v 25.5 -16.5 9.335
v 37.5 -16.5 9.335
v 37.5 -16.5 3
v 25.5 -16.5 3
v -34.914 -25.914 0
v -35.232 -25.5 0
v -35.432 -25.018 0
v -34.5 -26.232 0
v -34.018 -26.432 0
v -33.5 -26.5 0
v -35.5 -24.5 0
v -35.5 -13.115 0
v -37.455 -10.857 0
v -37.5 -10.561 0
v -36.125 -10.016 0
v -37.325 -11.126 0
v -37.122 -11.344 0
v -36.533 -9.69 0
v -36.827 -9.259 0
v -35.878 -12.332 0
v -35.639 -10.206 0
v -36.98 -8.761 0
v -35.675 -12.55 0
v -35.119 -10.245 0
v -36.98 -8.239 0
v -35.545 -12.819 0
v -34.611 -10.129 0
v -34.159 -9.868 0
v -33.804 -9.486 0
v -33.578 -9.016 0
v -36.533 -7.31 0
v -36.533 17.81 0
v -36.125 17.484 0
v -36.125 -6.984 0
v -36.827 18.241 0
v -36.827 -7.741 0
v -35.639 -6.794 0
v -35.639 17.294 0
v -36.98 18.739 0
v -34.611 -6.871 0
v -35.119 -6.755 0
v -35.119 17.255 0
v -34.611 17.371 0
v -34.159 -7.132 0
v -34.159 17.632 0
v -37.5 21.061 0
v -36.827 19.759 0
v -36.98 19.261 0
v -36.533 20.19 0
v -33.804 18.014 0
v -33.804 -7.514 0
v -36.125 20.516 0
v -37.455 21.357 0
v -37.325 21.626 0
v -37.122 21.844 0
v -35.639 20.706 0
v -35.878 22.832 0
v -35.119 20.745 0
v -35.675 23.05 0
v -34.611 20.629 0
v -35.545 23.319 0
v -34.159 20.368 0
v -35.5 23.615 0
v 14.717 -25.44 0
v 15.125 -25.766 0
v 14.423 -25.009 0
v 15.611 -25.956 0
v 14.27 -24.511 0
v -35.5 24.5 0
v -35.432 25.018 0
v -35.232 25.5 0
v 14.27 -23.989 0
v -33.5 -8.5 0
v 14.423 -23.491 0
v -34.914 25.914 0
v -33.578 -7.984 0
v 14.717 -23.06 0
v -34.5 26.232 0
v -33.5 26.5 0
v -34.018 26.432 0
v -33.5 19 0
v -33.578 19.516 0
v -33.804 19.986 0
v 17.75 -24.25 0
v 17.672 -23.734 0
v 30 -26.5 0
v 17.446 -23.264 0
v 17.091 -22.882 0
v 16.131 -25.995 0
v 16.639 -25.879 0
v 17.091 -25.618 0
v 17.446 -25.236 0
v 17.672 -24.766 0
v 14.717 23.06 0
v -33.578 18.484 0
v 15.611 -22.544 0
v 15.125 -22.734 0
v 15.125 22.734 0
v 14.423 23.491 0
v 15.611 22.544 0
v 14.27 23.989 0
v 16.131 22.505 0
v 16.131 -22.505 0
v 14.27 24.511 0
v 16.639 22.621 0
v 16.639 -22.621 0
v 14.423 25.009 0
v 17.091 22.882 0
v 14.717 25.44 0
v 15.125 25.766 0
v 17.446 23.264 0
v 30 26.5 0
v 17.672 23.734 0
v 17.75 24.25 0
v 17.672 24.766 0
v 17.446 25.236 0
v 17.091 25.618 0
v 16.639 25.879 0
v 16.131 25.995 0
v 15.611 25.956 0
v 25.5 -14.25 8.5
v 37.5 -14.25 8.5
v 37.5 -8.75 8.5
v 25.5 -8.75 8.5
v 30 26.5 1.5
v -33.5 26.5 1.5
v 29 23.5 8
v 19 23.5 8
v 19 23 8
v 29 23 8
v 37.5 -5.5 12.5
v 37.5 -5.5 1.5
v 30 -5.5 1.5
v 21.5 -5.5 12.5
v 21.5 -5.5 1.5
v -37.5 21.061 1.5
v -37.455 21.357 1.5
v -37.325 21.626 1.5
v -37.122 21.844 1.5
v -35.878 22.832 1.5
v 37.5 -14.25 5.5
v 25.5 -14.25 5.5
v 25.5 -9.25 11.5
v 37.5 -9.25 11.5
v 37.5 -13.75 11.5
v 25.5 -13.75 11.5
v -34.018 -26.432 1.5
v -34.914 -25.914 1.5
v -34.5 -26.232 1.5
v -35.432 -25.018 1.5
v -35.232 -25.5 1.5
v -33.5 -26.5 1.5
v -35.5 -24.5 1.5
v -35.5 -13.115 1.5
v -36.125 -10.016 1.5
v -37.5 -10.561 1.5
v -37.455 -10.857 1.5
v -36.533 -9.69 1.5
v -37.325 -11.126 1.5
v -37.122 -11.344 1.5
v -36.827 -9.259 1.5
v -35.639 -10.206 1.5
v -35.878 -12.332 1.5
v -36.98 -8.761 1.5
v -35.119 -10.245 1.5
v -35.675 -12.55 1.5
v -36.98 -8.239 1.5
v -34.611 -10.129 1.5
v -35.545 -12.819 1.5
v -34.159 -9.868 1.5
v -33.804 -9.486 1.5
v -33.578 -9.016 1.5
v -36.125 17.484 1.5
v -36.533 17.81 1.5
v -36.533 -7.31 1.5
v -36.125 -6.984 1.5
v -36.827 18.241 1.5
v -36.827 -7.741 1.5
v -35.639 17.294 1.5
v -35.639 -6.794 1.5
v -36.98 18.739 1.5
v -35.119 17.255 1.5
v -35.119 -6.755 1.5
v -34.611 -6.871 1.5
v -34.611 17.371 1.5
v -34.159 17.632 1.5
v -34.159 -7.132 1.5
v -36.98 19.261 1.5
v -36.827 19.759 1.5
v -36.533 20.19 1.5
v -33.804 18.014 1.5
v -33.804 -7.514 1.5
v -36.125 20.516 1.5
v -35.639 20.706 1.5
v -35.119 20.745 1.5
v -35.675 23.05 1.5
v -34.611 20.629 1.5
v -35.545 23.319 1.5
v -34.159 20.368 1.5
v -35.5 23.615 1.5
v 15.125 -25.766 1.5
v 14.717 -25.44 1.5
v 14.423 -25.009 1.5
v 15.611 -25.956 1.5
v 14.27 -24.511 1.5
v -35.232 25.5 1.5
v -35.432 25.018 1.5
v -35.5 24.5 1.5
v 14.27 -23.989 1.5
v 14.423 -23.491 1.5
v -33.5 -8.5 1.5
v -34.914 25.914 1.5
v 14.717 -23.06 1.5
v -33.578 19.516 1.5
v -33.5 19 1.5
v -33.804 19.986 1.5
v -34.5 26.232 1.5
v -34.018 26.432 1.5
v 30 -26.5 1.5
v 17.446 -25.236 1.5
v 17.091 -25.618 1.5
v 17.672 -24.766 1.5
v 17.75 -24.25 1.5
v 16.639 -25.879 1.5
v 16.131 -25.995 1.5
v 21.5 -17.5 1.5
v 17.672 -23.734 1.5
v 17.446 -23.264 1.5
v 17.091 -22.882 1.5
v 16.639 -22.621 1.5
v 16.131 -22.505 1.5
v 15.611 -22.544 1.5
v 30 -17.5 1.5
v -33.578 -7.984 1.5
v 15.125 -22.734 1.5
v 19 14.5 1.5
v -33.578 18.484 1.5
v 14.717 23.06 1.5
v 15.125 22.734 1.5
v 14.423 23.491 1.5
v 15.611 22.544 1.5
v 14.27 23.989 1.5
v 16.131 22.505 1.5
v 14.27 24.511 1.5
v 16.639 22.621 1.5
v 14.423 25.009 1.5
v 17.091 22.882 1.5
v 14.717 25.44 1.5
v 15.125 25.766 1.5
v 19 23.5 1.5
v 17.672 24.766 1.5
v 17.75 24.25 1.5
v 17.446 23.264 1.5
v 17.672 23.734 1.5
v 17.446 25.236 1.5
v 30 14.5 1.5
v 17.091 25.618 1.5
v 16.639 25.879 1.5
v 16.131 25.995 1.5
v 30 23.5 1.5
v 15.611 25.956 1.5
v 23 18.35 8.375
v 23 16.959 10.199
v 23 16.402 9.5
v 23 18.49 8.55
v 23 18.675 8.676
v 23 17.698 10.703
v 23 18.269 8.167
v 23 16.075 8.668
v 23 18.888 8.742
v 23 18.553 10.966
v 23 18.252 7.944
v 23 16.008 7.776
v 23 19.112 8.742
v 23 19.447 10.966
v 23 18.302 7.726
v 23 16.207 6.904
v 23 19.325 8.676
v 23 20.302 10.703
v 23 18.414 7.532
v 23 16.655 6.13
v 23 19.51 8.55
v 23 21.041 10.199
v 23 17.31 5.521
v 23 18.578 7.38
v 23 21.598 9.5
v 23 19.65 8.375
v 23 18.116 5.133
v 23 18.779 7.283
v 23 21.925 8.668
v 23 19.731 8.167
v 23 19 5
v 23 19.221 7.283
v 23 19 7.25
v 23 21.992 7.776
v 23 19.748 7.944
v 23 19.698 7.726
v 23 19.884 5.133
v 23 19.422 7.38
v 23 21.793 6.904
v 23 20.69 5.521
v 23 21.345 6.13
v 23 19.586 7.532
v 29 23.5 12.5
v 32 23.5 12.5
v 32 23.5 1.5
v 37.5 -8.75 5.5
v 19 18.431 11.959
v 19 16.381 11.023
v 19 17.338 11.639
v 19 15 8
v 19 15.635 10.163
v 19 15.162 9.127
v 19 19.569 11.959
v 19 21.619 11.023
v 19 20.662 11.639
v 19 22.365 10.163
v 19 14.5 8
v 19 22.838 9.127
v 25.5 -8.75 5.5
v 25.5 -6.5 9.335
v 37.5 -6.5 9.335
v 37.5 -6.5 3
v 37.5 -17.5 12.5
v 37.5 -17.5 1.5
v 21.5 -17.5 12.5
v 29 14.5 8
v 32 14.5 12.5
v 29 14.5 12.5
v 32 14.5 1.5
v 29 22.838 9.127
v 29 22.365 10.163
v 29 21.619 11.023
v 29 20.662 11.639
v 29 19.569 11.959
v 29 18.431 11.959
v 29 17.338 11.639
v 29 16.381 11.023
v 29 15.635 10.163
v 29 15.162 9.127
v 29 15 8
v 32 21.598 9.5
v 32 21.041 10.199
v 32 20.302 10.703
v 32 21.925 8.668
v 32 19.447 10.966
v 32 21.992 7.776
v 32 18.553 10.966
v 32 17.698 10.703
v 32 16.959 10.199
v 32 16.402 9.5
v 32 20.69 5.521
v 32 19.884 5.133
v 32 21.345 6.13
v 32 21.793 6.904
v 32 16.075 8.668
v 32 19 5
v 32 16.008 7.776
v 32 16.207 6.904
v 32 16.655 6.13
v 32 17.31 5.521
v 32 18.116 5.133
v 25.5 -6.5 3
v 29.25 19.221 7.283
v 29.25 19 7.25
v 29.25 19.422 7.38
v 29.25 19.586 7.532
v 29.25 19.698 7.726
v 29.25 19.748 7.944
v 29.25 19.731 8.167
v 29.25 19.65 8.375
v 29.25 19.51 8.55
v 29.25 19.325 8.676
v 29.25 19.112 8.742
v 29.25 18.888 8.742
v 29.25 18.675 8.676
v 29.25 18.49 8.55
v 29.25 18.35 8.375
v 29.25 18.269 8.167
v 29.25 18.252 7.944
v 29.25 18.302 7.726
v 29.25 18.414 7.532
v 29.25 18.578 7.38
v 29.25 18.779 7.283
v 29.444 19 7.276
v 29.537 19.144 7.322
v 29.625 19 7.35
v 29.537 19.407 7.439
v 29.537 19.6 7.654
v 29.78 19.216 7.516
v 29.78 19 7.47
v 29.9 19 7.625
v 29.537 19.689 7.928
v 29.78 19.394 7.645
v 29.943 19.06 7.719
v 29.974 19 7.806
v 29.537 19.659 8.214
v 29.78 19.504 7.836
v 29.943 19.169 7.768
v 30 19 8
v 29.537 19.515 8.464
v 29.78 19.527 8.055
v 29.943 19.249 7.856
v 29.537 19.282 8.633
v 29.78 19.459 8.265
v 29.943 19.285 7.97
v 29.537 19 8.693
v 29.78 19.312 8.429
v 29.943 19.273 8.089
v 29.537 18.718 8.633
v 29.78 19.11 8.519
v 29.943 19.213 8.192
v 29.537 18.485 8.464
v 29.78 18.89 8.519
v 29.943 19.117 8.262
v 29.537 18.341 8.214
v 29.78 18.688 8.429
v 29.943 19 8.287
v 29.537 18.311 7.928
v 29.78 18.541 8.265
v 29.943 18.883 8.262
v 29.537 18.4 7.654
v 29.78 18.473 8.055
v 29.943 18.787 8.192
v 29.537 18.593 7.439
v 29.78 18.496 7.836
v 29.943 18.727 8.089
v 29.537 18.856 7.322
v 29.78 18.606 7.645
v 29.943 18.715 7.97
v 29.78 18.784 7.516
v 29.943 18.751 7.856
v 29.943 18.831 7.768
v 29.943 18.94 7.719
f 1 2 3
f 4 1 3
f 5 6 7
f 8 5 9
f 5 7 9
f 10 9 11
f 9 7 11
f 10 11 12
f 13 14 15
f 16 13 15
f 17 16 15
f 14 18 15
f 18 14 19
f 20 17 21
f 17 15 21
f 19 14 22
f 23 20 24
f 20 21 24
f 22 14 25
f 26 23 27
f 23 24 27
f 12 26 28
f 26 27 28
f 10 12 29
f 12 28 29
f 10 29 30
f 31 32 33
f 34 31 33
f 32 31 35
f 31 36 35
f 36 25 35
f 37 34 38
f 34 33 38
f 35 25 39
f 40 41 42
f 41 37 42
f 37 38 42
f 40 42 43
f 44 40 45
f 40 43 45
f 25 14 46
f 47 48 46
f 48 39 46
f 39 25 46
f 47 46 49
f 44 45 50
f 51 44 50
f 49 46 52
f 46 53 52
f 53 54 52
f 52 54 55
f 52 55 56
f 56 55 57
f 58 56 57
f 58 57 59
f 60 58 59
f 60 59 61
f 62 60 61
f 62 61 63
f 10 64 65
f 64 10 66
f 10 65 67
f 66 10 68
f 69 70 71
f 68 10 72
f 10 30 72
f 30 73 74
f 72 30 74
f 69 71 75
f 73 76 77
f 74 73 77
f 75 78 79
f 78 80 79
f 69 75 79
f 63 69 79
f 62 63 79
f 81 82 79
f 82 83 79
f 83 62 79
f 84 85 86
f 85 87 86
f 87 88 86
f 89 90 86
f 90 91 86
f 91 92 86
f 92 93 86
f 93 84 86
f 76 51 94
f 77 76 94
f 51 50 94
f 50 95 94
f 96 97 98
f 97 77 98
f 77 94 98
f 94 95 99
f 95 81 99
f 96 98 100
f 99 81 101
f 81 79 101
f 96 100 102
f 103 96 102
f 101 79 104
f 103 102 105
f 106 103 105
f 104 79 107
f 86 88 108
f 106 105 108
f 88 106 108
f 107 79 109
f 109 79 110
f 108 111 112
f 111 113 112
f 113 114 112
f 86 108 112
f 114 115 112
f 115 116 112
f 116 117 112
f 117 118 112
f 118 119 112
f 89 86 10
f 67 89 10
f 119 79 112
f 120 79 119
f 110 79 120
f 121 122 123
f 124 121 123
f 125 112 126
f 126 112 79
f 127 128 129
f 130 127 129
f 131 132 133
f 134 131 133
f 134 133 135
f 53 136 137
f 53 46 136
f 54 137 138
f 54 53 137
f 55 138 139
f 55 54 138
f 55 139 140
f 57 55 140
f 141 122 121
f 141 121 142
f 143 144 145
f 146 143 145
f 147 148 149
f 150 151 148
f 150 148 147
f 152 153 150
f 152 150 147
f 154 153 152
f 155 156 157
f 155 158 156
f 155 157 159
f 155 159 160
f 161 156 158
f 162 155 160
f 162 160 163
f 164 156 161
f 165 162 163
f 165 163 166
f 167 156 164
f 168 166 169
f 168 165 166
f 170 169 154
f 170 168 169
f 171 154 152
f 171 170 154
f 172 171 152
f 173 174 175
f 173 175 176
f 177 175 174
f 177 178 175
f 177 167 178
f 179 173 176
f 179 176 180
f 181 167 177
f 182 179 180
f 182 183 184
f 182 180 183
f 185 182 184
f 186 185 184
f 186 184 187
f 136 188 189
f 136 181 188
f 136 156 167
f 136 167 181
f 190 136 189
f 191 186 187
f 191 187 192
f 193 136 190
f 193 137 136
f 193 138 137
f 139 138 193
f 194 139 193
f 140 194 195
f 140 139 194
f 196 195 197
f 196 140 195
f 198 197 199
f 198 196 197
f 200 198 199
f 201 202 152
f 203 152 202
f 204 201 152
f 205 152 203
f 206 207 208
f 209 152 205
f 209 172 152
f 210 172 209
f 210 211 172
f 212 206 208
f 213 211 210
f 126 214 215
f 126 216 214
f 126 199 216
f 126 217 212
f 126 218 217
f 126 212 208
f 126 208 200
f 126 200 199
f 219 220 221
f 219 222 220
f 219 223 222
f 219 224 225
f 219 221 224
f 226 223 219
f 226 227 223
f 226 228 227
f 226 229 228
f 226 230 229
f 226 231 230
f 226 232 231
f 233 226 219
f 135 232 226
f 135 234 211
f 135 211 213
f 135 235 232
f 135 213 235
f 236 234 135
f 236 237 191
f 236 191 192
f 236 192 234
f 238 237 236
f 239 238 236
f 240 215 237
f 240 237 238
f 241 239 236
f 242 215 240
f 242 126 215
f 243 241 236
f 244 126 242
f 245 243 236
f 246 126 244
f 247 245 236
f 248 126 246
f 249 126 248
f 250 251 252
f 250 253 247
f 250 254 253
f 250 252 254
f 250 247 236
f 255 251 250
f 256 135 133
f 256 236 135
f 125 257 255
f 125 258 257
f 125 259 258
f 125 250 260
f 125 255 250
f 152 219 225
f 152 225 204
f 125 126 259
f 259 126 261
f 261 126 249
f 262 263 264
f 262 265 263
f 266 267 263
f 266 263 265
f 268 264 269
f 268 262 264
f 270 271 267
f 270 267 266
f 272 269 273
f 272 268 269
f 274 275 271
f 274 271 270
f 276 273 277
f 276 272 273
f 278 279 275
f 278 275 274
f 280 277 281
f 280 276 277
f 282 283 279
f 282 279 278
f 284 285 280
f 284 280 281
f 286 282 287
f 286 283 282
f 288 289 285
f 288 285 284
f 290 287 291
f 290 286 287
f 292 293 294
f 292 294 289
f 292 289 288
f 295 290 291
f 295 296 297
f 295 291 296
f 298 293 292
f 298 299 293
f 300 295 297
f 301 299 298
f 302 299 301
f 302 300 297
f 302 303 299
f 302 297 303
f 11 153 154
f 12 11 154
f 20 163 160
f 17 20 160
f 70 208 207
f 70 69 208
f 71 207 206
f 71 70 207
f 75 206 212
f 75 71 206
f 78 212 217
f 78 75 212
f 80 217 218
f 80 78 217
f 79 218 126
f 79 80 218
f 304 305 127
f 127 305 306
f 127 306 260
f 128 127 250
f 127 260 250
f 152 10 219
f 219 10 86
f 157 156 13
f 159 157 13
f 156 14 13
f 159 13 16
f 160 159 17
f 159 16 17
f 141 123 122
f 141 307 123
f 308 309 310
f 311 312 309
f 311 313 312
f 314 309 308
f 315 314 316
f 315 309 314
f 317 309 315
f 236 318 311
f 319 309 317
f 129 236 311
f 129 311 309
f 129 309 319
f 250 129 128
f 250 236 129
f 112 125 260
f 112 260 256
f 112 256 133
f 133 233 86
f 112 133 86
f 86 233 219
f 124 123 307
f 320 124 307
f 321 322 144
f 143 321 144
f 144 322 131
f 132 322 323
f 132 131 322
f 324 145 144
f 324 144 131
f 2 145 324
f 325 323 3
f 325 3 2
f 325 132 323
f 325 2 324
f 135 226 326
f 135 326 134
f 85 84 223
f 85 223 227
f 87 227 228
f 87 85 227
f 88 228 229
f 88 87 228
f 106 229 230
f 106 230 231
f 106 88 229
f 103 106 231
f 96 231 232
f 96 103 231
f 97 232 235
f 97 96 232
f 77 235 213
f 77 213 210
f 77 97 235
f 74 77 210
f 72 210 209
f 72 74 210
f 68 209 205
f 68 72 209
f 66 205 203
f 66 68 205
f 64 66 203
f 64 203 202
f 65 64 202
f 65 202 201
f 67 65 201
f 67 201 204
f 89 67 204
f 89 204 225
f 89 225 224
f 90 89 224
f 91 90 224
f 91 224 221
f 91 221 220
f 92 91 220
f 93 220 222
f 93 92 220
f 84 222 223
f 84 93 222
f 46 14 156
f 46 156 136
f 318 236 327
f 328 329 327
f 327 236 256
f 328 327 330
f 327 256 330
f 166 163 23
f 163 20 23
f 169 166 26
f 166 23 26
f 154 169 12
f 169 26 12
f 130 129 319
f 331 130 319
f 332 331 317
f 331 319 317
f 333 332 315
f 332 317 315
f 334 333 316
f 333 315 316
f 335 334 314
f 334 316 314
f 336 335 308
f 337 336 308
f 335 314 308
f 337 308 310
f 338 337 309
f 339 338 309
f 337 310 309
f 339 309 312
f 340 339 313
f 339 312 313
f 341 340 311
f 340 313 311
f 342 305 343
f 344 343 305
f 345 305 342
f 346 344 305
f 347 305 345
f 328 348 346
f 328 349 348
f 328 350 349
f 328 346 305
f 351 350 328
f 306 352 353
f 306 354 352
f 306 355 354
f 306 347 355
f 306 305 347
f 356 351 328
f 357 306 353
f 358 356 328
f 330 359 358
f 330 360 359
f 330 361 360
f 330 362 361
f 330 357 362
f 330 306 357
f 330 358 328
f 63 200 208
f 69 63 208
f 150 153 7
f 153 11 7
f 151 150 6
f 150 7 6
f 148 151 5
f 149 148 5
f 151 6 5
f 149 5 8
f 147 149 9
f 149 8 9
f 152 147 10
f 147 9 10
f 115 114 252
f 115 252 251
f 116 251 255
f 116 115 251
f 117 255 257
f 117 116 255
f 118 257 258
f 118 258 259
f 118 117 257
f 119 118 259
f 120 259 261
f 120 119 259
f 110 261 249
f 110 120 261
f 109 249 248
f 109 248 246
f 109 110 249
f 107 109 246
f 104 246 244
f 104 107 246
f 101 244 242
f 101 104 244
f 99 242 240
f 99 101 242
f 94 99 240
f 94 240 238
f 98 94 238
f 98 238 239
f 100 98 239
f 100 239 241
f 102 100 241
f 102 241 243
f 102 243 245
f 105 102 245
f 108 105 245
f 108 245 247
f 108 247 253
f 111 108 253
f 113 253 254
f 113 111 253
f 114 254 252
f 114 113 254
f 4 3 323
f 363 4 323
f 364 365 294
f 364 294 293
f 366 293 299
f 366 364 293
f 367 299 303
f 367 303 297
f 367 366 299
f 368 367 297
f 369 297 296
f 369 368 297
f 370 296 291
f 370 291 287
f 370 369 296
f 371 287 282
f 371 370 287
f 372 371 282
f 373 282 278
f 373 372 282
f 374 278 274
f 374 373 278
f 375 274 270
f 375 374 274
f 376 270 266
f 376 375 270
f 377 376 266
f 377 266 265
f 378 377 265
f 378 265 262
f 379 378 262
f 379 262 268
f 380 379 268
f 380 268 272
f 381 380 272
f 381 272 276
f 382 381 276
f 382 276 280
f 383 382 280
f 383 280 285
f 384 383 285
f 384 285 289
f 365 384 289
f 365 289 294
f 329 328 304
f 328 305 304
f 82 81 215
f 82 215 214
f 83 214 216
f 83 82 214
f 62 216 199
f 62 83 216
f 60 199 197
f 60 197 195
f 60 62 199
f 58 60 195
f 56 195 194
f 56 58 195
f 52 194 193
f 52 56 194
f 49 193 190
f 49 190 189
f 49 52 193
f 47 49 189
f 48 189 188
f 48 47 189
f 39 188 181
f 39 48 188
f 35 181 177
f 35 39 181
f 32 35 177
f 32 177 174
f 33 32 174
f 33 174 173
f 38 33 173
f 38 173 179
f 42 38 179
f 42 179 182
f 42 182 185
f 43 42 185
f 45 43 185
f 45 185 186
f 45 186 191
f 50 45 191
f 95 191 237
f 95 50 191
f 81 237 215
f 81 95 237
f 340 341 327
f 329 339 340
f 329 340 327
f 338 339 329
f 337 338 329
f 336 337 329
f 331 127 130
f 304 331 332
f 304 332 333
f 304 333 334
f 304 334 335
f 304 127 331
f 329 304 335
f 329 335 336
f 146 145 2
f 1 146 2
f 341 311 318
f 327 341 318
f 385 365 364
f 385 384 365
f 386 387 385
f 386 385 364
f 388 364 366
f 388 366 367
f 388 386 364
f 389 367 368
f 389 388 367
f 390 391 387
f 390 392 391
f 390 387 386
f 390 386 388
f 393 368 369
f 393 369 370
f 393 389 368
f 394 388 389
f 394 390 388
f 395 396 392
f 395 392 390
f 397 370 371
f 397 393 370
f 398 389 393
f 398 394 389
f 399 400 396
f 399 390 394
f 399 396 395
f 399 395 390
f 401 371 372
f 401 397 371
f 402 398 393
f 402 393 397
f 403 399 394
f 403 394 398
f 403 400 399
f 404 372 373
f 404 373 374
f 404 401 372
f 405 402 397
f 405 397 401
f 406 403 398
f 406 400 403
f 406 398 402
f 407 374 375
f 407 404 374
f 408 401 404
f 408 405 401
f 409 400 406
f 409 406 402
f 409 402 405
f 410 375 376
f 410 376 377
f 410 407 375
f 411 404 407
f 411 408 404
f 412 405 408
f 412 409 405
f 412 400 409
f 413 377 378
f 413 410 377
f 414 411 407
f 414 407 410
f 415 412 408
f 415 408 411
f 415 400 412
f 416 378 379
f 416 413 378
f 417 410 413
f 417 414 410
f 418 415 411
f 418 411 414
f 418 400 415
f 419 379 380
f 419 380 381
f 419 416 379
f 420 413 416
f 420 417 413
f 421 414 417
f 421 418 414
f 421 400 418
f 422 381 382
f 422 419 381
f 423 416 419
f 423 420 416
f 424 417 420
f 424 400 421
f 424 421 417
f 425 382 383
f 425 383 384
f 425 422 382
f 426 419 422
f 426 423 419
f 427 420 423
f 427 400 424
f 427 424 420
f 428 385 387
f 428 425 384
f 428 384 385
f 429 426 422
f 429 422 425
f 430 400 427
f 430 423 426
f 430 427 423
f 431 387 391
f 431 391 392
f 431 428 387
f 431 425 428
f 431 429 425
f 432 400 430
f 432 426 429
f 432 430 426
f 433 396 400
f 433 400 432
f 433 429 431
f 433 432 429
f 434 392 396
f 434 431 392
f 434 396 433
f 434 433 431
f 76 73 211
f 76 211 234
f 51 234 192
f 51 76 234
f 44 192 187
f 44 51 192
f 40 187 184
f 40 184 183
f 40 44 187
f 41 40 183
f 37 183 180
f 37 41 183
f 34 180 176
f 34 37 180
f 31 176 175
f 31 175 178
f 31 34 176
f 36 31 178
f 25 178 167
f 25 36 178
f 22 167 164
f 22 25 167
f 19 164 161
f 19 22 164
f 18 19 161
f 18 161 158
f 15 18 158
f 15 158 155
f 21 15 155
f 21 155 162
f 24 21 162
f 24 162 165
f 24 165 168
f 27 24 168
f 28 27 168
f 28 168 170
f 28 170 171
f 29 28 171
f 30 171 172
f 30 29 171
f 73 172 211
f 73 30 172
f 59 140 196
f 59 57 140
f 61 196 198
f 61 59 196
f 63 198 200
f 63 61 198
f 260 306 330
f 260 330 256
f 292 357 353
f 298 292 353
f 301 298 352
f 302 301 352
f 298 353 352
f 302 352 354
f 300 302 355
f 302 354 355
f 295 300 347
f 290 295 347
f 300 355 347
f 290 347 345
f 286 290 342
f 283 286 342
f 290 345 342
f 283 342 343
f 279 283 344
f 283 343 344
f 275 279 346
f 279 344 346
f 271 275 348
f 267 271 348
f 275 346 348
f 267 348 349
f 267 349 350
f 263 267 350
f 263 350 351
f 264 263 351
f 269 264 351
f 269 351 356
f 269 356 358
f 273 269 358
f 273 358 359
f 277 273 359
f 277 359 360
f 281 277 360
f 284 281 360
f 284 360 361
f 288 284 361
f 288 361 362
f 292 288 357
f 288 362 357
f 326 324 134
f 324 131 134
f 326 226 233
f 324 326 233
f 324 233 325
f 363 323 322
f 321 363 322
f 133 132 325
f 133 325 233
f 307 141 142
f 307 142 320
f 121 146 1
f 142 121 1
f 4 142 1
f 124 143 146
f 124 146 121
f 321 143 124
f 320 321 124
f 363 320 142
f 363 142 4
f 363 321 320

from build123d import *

# Parameters (mm, degrees)
SKETCH1_W           = 67.5
SKETCH1_H           = 53
SKETCH1_R           = 1.75
SKETCH1_W_2         = 7.5
BOSS_EXTRUDE1_DEPTH = 1.5
CUT_EXTRUDE1_DEPTH  = 2
FILLET1_R           = 1
FILLET2_R           = 2
SKETCH3_W           = 7.5
SKETCH3_H           = 9
CUT_EXTRUDE2_DEPTH  = 2
BOSS_EXTRUDE2_DEPTH = 11
SKETCH5_W           = 7.5
SKETCH5_H           = 12
CUT_EXTRUDE3_DEPTH  = 1.5
SKETCH6_W           = 3
SKETCH6_H           = 5.5
CUT_EXTRUDE4_DEPTH  = 12
BOSS_EXTRUDE3_DEPTH = 11
SKETCH8_W           = 2
SKETCH8_H           = 9
CUT_EXTRUDE5_DEPTH  = 1.5
SKETCH9_R           = 3
SKETCH9_R_2         = 0.75
CUT_EXTRUDE6_DEPTH  = 9
SKETCH10_R          = 0.75
CUT_EXTRUDE7_DEPTH  = 2
FILLET3_R           = 0.75
CUT_EXTRUDE8_DEPTH  = 10


with BuildPart() as part:
    # Sketch1 → Boss-Extrude1 (new body)
    with BuildSketch(Plane.XY):
        with Locations((-3.75, 0)):
            Rectangle(SKETCH1_W, SKETCH1_H)
        with Locations((-35.25, -8.5)):
            Circle(SKETCH1_R, mode=Mode.SUBTRACT)
        with Locations((16, -24.25)):
            Circle(SKETCH1_R, mode=Mode.SUBTRACT)
        with Locations((-35.25, 19)):
            Circle(SKETCH1_R, mode=Mode.SUBTRACT)
        with Locations((16, 24.25)):
            Circle(SKETCH1_R, mode=Mode.SUBTRACT)
        with Locations((33.75, 0)):
            Rectangle(SKETCH1_W_2, SKETCH1_H)
    extrude(amount=BOSS_EXTRUDE1_DEPTH)

    # Sketch2 → Cut-Extrude1 (cut)
    with BuildSketch(Plane.XY.offset(1.5)):
        Polygon((-37.5, 26.5), (-37.5, 21.544210715), (-35.5, 23.131873366), (-35.5, 26.5), align=None)
        Polygon((-37.5, -11.044210715), (-37.5, -26.5), (-35.5, -26.5), (-35.5, -16), (-35.5, -12.631873366), align=None)
    extrude(amount=-CUT_EXTRUDE1_DEPTH, mode=Mode.SUBTRACT)

    # Fillet1
    fillet1_edges = [part.edges().sort_by_distance(p)[0] for p in [
        (-35.5, 23.131873366, 0.75),
        (-37.5, 21.544210715, 0.75),
        (-35.5, -12.631873366, 0.75),
        (-37.5, -11.044210715, 0.75),
    ]]
    fillet(fillet1_edges, radius=FILLET1_R)

    # Fillet2
    fillet2_edges = [part.edges().sort_by_distance(p)[0] for p in [
        (-35.5, 26.5, 0.75),
        (-35.5, -26.5, 0.75),
    ]]
    fillet(fillet2_edges, radius=FILLET2_R)

    # Sketch3 → Cut-Extrude2 (cut)
    with BuildSketch(Plane.XY.offset(1.5)):
        Polygon((30, -5.5), (37.5, -5.5), (37.5, 26.5), (30, 26.5), (30, 23.5), (32, 23.5), (32, 14.5), (30, 14.5), align=None)
        with Locations((33.75, -22)):
            Rectangle(SKETCH3_W, SKETCH3_H)
    extrude(amount=-CUT_EXTRUDE2_DEPTH, mode=Mode.SUBTRACT)

    # Sketch4 → Boss-Extrude2 (add)
    with BuildSketch(Plane.XY.offset(1.5)):
        Polygon((37.5, -17.5), (30, -17.5), (21.5, -17.5), (21.5, -5.5), (30, -5.5), (37.5, -5.5), align=None)
    extrude(amount=BOSS_EXTRUDE2_DEPTH)

    # Sketch5 → Cut-Extrude3 (cut)
    with BuildSketch(Plane(origin=(0, 0, 0), x_dir=(-1, 0, 0), z_dir=(0, 0, -1))):
        with Locations((-33.75, -11.5)):
            Rectangle(SKETCH5_W, SKETCH5_H)
    extrude(amount=-CUT_EXTRUDE3_DEPTH, mode=Mode.SUBTRACT)

    # Sketch6 → Cut-Extrude4 (cut)
    with BuildSketch(Plane(origin=(37.5, 0, 0), x_dir=(0, 0, -1), z_dir=(1, 0, 0))):
        Polygon((-3, -16.5), (-3, -6.5), (-9.334936491, -6.5), (-11.5, -9.25), (-11.5, -13.75), (-9.334936491, -16.5), align=None)
        with Locations((-7, -11.5)):
            Rectangle(SKETCH6_W, SKETCH6_H, mode=Mode.SUBTRACT)
    extrude(amount=-CUT_EXTRUDE4_DEPTH, mode=Mode.SUBTRACT)

    # Sketch7 → Boss-Extrude3 (add)
    with BuildSketch(Plane.XY.offset(1.5)):
        Polygon((32, 14.5), (30, 14.5), (19, 14.5), (19, 23.5), (30, 23.5), (32, 23.5), align=None)
    extrude(amount=BOSS_EXTRUDE3_DEPTH)

    # Sketch8 → Cut-Extrude5 (cut)
    with BuildSketch(Plane(origin=(0, 0, 0), x_dir=(-1, 0, 0), z_dir=(0, 0, -1))):
        with Locations((-31, 19)):
            Rectangle(SKETCH8_W, SKETCH8_H)
    extrude(amount=-CUT_EXTRUDE5_DEPTH, mode=Mode.SUBTRACT)

    # Sketch9 → Cut-Extrude6 (cut)
    with BuildSketch(Plane(origin=(32, 0, 0), x_dir=(0, 0, -1), z_dir=(1, 0, 0))):
        with Locations((-8, 19)):
            Circle(SKETCH9_R)
        with Locations((-8, 19)):
            Circle(SKETCH9_R_2, mode=Mode.SUBTRACT)
    extrude(amount=-CUT_EXTRUDE6_DEPTH, mode=Mode.SUBTRACT)

    # Sketch10 → Cut-Extrude7 (cut)
    with BuildSketch(Plane(origin=(32, 0, 0), x_dir=(0, 0, -1), z_dir=(1, 0, 0))):
        with Locations((-8, 19)):
            Circle(SKETCH10_R)
    extrude(amount=-CUT_EXTRUDE7_DEPTH, mode=Mode.SUBTRACT)

    # Fillet3
    fillet3_edges = [part.edges().sort_by_distance(p)[0] for p in [
        (30, 19, 8.75),
    ]]
    fillet(fillet3_edges, radius=FILLET3_R)

    # Sketch11 → Cut-Extrude8 (cut)
    with BuildSketch(Plane.ZY.offset(-19)):
        with BuildLine():
            Line((8, 14.5), (12.5, 14.5))
            Line((12.5, 14.5), (12.5, 23.5))
            Line((12.5, 23.5), (8, 23.5))
            Line((8, 23.5), (8, 23))
            ThreePointArc((8, 23), (12, 19), (8, 15))
            Line((8, 15), (8, 14.5))
        make_face()
    extrude(amount=-CUT_EXTRUDE8_DEPTH, mode=Mode.SUBTRACT)


solid = part.part
